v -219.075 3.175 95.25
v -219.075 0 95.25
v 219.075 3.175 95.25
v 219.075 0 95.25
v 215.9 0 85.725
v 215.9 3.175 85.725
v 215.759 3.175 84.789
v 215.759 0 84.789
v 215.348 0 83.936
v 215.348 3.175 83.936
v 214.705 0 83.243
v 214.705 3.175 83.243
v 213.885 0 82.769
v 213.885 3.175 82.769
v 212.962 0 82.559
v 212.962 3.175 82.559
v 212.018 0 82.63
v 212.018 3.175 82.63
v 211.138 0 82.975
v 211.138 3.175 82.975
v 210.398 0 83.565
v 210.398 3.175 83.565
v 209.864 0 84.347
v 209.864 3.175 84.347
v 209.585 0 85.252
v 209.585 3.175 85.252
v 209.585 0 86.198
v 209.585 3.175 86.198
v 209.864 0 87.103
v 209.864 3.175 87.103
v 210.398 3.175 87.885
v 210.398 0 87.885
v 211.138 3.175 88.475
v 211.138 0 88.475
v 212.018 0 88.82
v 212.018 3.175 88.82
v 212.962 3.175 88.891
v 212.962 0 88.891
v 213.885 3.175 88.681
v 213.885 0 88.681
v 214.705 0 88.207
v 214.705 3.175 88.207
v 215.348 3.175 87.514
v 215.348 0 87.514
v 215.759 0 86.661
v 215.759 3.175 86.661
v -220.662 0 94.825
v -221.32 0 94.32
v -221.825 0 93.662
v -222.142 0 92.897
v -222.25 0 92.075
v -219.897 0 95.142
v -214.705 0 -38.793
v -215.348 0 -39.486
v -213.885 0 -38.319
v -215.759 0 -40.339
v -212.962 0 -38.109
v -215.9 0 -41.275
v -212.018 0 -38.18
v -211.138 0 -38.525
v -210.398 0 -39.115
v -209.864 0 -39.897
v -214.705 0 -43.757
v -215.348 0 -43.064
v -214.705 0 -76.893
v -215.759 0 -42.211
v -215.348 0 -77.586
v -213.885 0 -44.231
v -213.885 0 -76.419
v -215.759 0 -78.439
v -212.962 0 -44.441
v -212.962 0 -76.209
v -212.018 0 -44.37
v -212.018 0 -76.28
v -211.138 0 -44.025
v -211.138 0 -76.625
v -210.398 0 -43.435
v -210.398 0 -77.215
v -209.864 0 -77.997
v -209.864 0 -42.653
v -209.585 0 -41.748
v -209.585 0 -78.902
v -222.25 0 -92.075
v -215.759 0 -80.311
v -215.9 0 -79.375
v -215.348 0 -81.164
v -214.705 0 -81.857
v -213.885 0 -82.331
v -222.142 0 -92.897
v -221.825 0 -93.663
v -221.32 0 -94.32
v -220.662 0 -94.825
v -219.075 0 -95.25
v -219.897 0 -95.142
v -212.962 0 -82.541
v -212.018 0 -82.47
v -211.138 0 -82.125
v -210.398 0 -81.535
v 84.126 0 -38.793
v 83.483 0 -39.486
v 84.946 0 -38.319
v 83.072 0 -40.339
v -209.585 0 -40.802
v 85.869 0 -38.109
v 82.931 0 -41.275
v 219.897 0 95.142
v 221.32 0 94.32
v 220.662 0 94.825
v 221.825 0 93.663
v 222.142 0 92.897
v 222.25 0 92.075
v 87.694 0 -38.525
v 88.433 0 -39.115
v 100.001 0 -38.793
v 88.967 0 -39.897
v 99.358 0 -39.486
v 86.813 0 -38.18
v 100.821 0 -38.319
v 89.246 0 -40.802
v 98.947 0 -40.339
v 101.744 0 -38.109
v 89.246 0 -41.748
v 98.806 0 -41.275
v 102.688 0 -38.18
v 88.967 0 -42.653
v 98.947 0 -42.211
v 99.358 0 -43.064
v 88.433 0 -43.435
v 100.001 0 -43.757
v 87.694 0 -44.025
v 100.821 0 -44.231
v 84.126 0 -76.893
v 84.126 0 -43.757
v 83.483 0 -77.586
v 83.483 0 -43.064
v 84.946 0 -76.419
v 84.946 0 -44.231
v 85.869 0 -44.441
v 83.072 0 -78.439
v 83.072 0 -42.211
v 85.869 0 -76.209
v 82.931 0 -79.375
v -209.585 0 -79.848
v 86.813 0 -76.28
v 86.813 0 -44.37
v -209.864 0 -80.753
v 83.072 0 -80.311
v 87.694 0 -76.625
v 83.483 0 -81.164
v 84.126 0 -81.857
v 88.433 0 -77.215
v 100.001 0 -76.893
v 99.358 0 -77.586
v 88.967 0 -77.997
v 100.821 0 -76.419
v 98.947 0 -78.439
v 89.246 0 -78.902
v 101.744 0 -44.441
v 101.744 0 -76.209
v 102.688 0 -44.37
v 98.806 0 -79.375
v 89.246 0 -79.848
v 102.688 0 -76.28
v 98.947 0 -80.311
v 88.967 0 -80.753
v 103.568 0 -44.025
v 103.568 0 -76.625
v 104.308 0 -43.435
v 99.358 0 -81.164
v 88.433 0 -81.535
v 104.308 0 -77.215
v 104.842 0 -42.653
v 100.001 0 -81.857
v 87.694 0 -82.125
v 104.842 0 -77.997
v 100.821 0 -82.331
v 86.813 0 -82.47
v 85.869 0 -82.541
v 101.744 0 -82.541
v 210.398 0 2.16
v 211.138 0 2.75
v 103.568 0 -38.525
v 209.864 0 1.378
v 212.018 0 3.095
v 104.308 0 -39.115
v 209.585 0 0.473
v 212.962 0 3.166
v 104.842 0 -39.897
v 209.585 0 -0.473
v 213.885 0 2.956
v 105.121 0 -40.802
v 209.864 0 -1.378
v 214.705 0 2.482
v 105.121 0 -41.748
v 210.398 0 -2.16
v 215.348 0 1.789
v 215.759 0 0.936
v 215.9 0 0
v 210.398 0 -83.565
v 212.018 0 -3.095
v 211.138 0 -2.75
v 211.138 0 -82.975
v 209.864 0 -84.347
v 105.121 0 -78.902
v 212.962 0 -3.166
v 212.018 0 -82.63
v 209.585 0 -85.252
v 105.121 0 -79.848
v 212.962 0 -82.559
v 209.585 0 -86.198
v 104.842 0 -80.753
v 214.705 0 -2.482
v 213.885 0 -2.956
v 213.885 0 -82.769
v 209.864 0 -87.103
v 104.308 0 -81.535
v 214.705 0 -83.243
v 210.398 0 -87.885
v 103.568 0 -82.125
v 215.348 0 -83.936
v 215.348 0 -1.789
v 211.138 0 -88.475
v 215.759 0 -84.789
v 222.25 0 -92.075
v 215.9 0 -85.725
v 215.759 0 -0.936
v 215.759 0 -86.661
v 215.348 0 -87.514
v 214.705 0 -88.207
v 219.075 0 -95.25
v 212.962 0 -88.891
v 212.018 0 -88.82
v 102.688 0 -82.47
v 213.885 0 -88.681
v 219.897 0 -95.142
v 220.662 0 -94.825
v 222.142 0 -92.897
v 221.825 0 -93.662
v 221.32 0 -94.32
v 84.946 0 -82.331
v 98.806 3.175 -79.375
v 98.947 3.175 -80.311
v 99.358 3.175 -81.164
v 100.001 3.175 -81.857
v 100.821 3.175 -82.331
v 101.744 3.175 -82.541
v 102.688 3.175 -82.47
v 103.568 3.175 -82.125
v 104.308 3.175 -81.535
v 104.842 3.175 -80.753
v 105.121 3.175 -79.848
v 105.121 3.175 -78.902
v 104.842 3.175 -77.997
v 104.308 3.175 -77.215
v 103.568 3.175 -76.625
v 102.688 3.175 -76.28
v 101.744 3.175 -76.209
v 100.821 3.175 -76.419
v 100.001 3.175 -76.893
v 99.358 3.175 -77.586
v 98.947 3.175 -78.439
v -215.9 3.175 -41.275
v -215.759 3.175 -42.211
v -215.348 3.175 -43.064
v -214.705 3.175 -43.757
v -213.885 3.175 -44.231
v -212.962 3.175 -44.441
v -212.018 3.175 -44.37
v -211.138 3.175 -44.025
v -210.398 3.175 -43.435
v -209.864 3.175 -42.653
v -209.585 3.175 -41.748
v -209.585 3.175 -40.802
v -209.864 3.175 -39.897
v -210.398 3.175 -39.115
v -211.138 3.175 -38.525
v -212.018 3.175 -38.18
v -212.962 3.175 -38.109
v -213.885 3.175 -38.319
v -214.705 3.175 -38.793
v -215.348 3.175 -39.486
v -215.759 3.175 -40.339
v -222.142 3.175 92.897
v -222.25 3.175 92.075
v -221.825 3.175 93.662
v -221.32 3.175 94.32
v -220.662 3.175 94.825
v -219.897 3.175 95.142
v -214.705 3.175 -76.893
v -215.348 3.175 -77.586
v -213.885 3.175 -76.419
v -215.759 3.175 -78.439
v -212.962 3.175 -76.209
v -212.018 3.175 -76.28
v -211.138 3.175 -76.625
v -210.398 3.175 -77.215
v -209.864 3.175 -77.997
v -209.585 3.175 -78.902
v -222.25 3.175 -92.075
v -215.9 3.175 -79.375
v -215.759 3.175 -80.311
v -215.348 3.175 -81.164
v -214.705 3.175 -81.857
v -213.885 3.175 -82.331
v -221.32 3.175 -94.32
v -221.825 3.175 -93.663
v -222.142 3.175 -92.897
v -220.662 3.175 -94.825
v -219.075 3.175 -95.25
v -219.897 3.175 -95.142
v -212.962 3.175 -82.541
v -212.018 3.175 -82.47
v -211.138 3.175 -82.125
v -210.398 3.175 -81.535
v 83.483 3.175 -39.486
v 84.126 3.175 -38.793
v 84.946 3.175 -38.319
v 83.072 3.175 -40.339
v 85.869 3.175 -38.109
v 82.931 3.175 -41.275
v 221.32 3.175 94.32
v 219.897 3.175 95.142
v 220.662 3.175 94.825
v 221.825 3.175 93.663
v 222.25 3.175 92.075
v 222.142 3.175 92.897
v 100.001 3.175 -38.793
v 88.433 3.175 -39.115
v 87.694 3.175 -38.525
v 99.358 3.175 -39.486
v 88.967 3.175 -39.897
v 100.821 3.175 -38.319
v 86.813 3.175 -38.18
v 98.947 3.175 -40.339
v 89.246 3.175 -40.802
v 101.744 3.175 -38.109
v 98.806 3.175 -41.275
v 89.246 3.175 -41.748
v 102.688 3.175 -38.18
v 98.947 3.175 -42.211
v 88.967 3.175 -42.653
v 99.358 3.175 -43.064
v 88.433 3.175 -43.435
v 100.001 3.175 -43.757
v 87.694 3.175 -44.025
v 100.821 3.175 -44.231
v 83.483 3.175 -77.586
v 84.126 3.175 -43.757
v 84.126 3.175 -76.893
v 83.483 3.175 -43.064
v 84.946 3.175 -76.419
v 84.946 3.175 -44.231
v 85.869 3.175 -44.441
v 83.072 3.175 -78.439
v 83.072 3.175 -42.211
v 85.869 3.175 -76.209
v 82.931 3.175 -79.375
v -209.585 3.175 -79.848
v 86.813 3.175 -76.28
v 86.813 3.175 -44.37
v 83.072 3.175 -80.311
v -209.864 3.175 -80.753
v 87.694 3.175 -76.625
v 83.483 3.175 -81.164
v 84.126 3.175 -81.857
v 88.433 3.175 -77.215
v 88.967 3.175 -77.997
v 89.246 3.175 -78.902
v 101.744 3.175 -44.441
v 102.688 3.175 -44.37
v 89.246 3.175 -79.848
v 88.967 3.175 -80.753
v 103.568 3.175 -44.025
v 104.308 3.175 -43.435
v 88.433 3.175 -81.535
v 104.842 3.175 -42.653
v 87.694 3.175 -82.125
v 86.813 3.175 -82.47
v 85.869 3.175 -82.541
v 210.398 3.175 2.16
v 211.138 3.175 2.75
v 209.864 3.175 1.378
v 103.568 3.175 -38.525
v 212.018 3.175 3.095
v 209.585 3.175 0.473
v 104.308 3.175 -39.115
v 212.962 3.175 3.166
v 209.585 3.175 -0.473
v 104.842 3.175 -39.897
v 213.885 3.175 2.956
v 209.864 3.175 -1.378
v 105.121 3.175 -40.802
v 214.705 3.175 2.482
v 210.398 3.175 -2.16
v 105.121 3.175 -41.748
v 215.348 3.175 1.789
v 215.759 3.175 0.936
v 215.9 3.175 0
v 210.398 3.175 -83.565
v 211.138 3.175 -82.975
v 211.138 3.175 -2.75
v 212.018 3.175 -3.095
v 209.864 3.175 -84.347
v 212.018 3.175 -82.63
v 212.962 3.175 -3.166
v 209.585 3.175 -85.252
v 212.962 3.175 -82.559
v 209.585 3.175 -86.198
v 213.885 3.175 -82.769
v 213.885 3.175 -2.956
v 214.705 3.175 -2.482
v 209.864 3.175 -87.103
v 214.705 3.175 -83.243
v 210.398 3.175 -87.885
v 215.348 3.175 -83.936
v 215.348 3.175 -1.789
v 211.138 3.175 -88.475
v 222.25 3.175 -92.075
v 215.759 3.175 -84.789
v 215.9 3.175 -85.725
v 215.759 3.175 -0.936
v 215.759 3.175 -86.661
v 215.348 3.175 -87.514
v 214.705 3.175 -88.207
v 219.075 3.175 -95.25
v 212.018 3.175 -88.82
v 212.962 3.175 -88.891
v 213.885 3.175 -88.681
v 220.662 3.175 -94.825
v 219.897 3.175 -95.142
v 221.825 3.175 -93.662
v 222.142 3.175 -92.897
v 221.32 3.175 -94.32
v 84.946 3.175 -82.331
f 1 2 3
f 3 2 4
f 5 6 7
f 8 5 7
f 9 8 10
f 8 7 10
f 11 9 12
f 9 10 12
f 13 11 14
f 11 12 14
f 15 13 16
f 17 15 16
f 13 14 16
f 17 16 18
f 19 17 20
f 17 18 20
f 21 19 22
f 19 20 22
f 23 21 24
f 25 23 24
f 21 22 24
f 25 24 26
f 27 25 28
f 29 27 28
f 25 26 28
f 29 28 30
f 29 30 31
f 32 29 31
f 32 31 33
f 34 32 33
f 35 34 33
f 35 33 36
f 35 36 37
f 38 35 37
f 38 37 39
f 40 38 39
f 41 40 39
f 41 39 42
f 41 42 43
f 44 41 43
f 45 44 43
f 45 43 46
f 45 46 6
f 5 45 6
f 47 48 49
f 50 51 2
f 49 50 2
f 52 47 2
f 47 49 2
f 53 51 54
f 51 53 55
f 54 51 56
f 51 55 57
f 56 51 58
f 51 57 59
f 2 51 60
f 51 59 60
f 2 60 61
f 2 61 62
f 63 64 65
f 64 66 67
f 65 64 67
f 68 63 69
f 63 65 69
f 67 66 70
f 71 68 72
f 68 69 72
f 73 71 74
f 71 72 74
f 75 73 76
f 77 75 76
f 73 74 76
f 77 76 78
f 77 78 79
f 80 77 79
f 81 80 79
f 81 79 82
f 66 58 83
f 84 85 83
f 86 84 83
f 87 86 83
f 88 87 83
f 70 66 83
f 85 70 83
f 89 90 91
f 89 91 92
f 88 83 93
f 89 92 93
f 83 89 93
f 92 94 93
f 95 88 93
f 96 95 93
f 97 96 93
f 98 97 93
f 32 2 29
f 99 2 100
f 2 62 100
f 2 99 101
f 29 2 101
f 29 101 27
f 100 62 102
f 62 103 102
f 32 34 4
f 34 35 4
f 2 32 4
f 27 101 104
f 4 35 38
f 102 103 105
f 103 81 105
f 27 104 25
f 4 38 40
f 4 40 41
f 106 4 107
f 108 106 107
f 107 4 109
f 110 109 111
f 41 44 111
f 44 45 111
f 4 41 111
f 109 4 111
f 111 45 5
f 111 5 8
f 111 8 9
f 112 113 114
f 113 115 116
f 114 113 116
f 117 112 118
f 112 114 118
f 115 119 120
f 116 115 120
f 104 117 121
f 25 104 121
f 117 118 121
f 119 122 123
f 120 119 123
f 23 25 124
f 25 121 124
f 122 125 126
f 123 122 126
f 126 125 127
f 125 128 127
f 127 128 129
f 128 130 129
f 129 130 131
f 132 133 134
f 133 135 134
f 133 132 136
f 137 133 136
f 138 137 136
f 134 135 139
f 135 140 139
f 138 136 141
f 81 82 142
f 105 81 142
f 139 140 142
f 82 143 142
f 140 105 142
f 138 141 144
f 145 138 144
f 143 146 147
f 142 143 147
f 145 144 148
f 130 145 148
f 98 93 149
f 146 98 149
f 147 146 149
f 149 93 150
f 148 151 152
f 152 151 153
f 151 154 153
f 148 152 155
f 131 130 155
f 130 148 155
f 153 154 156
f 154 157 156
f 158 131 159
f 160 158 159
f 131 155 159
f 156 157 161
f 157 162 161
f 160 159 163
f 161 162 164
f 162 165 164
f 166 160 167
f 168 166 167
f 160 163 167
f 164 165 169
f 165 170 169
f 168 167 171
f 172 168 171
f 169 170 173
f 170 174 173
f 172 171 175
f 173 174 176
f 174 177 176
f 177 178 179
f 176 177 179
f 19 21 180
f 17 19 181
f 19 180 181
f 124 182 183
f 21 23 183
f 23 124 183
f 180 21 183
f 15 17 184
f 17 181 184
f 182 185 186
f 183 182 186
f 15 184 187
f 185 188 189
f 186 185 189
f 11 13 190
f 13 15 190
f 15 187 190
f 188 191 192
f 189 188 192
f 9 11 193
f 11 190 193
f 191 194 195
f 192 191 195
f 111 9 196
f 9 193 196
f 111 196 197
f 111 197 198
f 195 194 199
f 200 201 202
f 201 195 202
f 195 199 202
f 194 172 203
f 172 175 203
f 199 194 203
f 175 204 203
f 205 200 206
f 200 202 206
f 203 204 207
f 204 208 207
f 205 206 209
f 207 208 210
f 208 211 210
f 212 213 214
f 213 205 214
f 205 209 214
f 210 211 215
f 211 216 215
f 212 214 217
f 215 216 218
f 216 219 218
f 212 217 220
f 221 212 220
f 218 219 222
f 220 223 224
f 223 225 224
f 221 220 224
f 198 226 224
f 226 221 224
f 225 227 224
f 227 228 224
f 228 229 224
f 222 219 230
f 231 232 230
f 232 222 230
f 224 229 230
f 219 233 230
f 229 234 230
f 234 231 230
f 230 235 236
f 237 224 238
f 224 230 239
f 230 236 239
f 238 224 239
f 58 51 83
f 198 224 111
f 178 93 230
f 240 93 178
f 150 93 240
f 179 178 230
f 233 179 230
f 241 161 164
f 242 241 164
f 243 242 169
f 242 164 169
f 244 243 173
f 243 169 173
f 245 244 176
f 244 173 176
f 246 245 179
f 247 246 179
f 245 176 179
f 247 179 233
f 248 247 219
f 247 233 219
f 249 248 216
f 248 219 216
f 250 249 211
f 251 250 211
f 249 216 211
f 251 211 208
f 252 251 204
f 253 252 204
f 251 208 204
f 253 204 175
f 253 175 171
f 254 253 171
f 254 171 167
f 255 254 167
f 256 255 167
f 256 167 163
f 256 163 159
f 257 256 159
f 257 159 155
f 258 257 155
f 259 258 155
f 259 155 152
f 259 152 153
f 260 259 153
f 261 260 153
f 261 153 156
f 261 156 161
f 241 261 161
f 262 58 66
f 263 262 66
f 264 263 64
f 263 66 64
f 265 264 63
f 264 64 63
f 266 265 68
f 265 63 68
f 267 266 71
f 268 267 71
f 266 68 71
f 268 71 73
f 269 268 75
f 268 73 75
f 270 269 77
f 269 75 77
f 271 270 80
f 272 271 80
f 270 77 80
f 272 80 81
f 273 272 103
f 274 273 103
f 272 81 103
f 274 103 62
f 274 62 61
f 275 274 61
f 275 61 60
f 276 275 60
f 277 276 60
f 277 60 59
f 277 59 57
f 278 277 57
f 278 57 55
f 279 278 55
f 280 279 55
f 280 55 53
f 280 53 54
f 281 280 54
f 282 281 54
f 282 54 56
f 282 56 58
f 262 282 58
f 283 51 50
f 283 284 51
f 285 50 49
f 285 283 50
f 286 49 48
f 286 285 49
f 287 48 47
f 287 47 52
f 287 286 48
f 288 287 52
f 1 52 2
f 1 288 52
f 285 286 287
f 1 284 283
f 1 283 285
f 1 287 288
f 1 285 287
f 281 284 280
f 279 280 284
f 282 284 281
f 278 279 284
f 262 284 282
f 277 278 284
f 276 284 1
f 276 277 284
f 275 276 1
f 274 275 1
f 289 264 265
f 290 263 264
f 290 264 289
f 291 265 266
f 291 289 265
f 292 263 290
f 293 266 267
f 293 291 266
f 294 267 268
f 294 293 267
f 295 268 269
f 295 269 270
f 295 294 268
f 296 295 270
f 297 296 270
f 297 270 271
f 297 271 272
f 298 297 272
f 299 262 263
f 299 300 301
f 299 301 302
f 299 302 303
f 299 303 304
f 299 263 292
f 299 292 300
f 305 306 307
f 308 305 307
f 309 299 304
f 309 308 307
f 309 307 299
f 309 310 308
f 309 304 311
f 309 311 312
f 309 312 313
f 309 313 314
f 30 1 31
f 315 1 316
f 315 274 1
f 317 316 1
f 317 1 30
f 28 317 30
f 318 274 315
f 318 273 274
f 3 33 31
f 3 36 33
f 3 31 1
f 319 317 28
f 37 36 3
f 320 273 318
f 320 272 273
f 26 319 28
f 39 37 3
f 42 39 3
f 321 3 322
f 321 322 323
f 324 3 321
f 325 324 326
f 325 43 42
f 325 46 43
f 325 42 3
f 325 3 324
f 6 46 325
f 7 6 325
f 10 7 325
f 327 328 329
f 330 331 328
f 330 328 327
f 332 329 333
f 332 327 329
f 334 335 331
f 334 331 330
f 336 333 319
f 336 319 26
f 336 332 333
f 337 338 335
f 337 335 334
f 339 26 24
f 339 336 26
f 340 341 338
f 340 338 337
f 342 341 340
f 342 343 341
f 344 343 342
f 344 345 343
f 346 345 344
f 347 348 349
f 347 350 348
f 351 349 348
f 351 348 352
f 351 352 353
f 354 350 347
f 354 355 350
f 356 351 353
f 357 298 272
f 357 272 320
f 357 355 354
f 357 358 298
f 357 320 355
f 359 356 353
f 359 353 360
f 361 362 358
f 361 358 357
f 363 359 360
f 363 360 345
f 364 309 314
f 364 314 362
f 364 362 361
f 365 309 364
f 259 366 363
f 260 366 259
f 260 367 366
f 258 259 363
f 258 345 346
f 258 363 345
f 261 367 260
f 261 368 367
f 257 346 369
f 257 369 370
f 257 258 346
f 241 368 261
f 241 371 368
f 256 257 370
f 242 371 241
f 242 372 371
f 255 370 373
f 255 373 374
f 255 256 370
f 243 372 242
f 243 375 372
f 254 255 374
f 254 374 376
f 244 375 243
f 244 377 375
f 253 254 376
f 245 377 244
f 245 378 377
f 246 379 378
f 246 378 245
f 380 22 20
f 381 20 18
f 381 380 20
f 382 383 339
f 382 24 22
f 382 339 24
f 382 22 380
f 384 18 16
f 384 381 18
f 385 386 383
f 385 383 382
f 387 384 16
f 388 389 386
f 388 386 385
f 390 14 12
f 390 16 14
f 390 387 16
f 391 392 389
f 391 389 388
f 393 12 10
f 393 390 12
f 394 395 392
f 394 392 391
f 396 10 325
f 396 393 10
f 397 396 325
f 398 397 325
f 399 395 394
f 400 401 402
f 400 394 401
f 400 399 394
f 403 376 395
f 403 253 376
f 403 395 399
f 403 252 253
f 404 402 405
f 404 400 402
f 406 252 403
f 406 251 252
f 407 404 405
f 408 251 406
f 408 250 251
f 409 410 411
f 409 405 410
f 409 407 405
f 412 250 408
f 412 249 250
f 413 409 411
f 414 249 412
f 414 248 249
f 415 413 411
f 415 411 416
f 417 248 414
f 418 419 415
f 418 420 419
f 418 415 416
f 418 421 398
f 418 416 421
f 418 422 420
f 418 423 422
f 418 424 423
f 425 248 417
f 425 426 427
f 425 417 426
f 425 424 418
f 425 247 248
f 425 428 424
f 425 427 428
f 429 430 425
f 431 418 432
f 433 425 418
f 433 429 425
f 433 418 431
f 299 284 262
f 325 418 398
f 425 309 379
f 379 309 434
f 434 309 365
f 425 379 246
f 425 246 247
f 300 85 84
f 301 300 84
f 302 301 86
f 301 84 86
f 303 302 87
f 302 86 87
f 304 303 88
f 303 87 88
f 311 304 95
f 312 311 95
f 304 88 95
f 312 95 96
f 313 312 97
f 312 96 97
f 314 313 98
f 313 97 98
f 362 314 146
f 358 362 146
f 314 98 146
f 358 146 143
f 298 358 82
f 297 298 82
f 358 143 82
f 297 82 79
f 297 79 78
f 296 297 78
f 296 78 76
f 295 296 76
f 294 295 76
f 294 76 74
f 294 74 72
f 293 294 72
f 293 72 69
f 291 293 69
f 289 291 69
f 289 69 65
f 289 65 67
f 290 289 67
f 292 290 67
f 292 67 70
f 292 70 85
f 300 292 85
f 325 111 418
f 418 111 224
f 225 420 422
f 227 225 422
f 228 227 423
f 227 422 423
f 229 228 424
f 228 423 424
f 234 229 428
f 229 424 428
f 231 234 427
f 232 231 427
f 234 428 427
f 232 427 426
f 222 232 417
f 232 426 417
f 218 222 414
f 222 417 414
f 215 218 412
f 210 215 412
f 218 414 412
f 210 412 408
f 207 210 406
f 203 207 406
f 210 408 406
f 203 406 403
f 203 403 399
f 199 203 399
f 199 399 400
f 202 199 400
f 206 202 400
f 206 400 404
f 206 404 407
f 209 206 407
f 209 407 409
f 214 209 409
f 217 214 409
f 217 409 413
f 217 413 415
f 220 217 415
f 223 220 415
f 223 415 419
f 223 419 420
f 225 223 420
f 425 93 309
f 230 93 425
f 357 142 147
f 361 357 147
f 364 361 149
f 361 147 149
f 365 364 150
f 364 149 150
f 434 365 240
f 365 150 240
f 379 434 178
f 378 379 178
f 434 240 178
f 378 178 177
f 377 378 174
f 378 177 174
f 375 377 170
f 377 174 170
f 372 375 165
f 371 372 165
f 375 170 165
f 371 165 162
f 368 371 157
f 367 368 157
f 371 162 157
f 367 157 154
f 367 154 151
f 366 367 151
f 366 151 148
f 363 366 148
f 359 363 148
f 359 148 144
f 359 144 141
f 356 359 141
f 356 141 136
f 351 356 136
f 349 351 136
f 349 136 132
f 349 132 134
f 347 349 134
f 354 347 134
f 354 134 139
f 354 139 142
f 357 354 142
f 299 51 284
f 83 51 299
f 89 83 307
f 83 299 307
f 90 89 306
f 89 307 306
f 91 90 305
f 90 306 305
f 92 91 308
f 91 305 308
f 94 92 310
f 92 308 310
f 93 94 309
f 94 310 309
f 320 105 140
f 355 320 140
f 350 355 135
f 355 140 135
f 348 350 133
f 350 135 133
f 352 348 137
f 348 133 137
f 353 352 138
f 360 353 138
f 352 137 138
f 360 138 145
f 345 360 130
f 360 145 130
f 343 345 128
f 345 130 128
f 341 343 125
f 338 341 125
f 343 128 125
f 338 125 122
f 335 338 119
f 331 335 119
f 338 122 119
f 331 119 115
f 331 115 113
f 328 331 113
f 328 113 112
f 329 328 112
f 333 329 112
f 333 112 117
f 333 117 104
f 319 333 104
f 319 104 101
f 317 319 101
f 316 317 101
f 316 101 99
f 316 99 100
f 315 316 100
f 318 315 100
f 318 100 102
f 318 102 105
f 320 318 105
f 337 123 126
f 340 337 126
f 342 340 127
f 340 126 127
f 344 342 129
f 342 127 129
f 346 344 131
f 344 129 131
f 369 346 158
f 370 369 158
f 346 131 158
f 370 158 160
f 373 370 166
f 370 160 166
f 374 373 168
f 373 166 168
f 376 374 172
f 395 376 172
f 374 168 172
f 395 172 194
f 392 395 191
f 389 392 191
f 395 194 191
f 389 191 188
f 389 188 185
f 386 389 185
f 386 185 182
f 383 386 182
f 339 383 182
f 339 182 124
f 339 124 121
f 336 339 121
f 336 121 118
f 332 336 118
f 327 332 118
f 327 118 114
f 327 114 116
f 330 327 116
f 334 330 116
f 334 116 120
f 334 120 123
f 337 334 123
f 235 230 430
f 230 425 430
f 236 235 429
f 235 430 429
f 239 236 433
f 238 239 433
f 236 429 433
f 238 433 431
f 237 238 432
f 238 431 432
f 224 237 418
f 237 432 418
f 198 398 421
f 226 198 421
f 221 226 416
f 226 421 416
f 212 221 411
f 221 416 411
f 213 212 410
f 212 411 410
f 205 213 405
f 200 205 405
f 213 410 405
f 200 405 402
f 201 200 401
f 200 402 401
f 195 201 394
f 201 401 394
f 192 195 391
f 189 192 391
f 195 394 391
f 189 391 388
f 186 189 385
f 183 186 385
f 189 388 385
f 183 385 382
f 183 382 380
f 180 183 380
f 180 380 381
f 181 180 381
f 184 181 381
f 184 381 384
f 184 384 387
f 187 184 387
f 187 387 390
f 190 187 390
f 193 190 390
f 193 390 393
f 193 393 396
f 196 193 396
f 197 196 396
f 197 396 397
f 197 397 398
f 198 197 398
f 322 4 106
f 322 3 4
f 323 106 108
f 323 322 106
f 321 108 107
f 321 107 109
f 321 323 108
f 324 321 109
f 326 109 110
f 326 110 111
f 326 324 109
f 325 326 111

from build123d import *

# Parameters (mm, degrees)
SKETCH1_W                   = 444.5
SKETCH1_H                   = 190.5
BOSS_EXTRUDE1_DEPTH         = 3.175
F_1_4_0_25_DIAMETER_HOLE1_D = 6.35
FILLET1_R                   = 3.175
F_1_4_0_25_DIAMETER_HOLE2_D = 6.35


with BuildPart() as part:
    # Sketch1 → Boss-Extrude1 (new body)
    with BuildSketch(Plane(origin=(0, 0, 0), x_dir=(1, 0, 0), z_dir=(0, 1, 0))):
        Rectangle(SKETCH1_W, SKETCH1_H)
    extrude(amount=BOSS_EXTRUDE1_DEPTH)

    # 1/4 (0.25) Diameter Hole1 (through all)
    with Locations(Plane(origin=(0, 3.175, 0), x_dir=(1, 0, 0), z_dir=(0, 1, 0))):
        with Locations((-212.725, 79.375), (-212.725, 41.275), (101.981, 79.375), (101.981, 41.275), (86.106, 79.375), (86.106, 41.275)):
            Hole(F_1_4_0_25_DIAMETER_HOLE1_D / 2)

    # Fillet1
    fillet1_edges = [part.edges().sort_by_distance(p)[0] for p in [
        (222.25, 1.5875, 95.25),
        (-222.25, 1.5875, 95.25),
        (-222.25, 1.5875, -95.25),
        (222.25, 1.5875, -95.25),
    ]]
    fillet(fillet1_edges, radius=FILLET1_R)

    # 1/4 (0.25) Diameter Hole2 (through all)
    with Locations(Plane(origin=(0, 0, 0), x_dir=(-1, 0, 0), z_dir=(0, -1, 0))):
        with Locations((-212.725, 85.725), (-212.725, 0), (-212.725, -85.725)):
            Hole(F_1_4_0_25_DIAMETER_HOLE2_D / 2)


solid = part.part
